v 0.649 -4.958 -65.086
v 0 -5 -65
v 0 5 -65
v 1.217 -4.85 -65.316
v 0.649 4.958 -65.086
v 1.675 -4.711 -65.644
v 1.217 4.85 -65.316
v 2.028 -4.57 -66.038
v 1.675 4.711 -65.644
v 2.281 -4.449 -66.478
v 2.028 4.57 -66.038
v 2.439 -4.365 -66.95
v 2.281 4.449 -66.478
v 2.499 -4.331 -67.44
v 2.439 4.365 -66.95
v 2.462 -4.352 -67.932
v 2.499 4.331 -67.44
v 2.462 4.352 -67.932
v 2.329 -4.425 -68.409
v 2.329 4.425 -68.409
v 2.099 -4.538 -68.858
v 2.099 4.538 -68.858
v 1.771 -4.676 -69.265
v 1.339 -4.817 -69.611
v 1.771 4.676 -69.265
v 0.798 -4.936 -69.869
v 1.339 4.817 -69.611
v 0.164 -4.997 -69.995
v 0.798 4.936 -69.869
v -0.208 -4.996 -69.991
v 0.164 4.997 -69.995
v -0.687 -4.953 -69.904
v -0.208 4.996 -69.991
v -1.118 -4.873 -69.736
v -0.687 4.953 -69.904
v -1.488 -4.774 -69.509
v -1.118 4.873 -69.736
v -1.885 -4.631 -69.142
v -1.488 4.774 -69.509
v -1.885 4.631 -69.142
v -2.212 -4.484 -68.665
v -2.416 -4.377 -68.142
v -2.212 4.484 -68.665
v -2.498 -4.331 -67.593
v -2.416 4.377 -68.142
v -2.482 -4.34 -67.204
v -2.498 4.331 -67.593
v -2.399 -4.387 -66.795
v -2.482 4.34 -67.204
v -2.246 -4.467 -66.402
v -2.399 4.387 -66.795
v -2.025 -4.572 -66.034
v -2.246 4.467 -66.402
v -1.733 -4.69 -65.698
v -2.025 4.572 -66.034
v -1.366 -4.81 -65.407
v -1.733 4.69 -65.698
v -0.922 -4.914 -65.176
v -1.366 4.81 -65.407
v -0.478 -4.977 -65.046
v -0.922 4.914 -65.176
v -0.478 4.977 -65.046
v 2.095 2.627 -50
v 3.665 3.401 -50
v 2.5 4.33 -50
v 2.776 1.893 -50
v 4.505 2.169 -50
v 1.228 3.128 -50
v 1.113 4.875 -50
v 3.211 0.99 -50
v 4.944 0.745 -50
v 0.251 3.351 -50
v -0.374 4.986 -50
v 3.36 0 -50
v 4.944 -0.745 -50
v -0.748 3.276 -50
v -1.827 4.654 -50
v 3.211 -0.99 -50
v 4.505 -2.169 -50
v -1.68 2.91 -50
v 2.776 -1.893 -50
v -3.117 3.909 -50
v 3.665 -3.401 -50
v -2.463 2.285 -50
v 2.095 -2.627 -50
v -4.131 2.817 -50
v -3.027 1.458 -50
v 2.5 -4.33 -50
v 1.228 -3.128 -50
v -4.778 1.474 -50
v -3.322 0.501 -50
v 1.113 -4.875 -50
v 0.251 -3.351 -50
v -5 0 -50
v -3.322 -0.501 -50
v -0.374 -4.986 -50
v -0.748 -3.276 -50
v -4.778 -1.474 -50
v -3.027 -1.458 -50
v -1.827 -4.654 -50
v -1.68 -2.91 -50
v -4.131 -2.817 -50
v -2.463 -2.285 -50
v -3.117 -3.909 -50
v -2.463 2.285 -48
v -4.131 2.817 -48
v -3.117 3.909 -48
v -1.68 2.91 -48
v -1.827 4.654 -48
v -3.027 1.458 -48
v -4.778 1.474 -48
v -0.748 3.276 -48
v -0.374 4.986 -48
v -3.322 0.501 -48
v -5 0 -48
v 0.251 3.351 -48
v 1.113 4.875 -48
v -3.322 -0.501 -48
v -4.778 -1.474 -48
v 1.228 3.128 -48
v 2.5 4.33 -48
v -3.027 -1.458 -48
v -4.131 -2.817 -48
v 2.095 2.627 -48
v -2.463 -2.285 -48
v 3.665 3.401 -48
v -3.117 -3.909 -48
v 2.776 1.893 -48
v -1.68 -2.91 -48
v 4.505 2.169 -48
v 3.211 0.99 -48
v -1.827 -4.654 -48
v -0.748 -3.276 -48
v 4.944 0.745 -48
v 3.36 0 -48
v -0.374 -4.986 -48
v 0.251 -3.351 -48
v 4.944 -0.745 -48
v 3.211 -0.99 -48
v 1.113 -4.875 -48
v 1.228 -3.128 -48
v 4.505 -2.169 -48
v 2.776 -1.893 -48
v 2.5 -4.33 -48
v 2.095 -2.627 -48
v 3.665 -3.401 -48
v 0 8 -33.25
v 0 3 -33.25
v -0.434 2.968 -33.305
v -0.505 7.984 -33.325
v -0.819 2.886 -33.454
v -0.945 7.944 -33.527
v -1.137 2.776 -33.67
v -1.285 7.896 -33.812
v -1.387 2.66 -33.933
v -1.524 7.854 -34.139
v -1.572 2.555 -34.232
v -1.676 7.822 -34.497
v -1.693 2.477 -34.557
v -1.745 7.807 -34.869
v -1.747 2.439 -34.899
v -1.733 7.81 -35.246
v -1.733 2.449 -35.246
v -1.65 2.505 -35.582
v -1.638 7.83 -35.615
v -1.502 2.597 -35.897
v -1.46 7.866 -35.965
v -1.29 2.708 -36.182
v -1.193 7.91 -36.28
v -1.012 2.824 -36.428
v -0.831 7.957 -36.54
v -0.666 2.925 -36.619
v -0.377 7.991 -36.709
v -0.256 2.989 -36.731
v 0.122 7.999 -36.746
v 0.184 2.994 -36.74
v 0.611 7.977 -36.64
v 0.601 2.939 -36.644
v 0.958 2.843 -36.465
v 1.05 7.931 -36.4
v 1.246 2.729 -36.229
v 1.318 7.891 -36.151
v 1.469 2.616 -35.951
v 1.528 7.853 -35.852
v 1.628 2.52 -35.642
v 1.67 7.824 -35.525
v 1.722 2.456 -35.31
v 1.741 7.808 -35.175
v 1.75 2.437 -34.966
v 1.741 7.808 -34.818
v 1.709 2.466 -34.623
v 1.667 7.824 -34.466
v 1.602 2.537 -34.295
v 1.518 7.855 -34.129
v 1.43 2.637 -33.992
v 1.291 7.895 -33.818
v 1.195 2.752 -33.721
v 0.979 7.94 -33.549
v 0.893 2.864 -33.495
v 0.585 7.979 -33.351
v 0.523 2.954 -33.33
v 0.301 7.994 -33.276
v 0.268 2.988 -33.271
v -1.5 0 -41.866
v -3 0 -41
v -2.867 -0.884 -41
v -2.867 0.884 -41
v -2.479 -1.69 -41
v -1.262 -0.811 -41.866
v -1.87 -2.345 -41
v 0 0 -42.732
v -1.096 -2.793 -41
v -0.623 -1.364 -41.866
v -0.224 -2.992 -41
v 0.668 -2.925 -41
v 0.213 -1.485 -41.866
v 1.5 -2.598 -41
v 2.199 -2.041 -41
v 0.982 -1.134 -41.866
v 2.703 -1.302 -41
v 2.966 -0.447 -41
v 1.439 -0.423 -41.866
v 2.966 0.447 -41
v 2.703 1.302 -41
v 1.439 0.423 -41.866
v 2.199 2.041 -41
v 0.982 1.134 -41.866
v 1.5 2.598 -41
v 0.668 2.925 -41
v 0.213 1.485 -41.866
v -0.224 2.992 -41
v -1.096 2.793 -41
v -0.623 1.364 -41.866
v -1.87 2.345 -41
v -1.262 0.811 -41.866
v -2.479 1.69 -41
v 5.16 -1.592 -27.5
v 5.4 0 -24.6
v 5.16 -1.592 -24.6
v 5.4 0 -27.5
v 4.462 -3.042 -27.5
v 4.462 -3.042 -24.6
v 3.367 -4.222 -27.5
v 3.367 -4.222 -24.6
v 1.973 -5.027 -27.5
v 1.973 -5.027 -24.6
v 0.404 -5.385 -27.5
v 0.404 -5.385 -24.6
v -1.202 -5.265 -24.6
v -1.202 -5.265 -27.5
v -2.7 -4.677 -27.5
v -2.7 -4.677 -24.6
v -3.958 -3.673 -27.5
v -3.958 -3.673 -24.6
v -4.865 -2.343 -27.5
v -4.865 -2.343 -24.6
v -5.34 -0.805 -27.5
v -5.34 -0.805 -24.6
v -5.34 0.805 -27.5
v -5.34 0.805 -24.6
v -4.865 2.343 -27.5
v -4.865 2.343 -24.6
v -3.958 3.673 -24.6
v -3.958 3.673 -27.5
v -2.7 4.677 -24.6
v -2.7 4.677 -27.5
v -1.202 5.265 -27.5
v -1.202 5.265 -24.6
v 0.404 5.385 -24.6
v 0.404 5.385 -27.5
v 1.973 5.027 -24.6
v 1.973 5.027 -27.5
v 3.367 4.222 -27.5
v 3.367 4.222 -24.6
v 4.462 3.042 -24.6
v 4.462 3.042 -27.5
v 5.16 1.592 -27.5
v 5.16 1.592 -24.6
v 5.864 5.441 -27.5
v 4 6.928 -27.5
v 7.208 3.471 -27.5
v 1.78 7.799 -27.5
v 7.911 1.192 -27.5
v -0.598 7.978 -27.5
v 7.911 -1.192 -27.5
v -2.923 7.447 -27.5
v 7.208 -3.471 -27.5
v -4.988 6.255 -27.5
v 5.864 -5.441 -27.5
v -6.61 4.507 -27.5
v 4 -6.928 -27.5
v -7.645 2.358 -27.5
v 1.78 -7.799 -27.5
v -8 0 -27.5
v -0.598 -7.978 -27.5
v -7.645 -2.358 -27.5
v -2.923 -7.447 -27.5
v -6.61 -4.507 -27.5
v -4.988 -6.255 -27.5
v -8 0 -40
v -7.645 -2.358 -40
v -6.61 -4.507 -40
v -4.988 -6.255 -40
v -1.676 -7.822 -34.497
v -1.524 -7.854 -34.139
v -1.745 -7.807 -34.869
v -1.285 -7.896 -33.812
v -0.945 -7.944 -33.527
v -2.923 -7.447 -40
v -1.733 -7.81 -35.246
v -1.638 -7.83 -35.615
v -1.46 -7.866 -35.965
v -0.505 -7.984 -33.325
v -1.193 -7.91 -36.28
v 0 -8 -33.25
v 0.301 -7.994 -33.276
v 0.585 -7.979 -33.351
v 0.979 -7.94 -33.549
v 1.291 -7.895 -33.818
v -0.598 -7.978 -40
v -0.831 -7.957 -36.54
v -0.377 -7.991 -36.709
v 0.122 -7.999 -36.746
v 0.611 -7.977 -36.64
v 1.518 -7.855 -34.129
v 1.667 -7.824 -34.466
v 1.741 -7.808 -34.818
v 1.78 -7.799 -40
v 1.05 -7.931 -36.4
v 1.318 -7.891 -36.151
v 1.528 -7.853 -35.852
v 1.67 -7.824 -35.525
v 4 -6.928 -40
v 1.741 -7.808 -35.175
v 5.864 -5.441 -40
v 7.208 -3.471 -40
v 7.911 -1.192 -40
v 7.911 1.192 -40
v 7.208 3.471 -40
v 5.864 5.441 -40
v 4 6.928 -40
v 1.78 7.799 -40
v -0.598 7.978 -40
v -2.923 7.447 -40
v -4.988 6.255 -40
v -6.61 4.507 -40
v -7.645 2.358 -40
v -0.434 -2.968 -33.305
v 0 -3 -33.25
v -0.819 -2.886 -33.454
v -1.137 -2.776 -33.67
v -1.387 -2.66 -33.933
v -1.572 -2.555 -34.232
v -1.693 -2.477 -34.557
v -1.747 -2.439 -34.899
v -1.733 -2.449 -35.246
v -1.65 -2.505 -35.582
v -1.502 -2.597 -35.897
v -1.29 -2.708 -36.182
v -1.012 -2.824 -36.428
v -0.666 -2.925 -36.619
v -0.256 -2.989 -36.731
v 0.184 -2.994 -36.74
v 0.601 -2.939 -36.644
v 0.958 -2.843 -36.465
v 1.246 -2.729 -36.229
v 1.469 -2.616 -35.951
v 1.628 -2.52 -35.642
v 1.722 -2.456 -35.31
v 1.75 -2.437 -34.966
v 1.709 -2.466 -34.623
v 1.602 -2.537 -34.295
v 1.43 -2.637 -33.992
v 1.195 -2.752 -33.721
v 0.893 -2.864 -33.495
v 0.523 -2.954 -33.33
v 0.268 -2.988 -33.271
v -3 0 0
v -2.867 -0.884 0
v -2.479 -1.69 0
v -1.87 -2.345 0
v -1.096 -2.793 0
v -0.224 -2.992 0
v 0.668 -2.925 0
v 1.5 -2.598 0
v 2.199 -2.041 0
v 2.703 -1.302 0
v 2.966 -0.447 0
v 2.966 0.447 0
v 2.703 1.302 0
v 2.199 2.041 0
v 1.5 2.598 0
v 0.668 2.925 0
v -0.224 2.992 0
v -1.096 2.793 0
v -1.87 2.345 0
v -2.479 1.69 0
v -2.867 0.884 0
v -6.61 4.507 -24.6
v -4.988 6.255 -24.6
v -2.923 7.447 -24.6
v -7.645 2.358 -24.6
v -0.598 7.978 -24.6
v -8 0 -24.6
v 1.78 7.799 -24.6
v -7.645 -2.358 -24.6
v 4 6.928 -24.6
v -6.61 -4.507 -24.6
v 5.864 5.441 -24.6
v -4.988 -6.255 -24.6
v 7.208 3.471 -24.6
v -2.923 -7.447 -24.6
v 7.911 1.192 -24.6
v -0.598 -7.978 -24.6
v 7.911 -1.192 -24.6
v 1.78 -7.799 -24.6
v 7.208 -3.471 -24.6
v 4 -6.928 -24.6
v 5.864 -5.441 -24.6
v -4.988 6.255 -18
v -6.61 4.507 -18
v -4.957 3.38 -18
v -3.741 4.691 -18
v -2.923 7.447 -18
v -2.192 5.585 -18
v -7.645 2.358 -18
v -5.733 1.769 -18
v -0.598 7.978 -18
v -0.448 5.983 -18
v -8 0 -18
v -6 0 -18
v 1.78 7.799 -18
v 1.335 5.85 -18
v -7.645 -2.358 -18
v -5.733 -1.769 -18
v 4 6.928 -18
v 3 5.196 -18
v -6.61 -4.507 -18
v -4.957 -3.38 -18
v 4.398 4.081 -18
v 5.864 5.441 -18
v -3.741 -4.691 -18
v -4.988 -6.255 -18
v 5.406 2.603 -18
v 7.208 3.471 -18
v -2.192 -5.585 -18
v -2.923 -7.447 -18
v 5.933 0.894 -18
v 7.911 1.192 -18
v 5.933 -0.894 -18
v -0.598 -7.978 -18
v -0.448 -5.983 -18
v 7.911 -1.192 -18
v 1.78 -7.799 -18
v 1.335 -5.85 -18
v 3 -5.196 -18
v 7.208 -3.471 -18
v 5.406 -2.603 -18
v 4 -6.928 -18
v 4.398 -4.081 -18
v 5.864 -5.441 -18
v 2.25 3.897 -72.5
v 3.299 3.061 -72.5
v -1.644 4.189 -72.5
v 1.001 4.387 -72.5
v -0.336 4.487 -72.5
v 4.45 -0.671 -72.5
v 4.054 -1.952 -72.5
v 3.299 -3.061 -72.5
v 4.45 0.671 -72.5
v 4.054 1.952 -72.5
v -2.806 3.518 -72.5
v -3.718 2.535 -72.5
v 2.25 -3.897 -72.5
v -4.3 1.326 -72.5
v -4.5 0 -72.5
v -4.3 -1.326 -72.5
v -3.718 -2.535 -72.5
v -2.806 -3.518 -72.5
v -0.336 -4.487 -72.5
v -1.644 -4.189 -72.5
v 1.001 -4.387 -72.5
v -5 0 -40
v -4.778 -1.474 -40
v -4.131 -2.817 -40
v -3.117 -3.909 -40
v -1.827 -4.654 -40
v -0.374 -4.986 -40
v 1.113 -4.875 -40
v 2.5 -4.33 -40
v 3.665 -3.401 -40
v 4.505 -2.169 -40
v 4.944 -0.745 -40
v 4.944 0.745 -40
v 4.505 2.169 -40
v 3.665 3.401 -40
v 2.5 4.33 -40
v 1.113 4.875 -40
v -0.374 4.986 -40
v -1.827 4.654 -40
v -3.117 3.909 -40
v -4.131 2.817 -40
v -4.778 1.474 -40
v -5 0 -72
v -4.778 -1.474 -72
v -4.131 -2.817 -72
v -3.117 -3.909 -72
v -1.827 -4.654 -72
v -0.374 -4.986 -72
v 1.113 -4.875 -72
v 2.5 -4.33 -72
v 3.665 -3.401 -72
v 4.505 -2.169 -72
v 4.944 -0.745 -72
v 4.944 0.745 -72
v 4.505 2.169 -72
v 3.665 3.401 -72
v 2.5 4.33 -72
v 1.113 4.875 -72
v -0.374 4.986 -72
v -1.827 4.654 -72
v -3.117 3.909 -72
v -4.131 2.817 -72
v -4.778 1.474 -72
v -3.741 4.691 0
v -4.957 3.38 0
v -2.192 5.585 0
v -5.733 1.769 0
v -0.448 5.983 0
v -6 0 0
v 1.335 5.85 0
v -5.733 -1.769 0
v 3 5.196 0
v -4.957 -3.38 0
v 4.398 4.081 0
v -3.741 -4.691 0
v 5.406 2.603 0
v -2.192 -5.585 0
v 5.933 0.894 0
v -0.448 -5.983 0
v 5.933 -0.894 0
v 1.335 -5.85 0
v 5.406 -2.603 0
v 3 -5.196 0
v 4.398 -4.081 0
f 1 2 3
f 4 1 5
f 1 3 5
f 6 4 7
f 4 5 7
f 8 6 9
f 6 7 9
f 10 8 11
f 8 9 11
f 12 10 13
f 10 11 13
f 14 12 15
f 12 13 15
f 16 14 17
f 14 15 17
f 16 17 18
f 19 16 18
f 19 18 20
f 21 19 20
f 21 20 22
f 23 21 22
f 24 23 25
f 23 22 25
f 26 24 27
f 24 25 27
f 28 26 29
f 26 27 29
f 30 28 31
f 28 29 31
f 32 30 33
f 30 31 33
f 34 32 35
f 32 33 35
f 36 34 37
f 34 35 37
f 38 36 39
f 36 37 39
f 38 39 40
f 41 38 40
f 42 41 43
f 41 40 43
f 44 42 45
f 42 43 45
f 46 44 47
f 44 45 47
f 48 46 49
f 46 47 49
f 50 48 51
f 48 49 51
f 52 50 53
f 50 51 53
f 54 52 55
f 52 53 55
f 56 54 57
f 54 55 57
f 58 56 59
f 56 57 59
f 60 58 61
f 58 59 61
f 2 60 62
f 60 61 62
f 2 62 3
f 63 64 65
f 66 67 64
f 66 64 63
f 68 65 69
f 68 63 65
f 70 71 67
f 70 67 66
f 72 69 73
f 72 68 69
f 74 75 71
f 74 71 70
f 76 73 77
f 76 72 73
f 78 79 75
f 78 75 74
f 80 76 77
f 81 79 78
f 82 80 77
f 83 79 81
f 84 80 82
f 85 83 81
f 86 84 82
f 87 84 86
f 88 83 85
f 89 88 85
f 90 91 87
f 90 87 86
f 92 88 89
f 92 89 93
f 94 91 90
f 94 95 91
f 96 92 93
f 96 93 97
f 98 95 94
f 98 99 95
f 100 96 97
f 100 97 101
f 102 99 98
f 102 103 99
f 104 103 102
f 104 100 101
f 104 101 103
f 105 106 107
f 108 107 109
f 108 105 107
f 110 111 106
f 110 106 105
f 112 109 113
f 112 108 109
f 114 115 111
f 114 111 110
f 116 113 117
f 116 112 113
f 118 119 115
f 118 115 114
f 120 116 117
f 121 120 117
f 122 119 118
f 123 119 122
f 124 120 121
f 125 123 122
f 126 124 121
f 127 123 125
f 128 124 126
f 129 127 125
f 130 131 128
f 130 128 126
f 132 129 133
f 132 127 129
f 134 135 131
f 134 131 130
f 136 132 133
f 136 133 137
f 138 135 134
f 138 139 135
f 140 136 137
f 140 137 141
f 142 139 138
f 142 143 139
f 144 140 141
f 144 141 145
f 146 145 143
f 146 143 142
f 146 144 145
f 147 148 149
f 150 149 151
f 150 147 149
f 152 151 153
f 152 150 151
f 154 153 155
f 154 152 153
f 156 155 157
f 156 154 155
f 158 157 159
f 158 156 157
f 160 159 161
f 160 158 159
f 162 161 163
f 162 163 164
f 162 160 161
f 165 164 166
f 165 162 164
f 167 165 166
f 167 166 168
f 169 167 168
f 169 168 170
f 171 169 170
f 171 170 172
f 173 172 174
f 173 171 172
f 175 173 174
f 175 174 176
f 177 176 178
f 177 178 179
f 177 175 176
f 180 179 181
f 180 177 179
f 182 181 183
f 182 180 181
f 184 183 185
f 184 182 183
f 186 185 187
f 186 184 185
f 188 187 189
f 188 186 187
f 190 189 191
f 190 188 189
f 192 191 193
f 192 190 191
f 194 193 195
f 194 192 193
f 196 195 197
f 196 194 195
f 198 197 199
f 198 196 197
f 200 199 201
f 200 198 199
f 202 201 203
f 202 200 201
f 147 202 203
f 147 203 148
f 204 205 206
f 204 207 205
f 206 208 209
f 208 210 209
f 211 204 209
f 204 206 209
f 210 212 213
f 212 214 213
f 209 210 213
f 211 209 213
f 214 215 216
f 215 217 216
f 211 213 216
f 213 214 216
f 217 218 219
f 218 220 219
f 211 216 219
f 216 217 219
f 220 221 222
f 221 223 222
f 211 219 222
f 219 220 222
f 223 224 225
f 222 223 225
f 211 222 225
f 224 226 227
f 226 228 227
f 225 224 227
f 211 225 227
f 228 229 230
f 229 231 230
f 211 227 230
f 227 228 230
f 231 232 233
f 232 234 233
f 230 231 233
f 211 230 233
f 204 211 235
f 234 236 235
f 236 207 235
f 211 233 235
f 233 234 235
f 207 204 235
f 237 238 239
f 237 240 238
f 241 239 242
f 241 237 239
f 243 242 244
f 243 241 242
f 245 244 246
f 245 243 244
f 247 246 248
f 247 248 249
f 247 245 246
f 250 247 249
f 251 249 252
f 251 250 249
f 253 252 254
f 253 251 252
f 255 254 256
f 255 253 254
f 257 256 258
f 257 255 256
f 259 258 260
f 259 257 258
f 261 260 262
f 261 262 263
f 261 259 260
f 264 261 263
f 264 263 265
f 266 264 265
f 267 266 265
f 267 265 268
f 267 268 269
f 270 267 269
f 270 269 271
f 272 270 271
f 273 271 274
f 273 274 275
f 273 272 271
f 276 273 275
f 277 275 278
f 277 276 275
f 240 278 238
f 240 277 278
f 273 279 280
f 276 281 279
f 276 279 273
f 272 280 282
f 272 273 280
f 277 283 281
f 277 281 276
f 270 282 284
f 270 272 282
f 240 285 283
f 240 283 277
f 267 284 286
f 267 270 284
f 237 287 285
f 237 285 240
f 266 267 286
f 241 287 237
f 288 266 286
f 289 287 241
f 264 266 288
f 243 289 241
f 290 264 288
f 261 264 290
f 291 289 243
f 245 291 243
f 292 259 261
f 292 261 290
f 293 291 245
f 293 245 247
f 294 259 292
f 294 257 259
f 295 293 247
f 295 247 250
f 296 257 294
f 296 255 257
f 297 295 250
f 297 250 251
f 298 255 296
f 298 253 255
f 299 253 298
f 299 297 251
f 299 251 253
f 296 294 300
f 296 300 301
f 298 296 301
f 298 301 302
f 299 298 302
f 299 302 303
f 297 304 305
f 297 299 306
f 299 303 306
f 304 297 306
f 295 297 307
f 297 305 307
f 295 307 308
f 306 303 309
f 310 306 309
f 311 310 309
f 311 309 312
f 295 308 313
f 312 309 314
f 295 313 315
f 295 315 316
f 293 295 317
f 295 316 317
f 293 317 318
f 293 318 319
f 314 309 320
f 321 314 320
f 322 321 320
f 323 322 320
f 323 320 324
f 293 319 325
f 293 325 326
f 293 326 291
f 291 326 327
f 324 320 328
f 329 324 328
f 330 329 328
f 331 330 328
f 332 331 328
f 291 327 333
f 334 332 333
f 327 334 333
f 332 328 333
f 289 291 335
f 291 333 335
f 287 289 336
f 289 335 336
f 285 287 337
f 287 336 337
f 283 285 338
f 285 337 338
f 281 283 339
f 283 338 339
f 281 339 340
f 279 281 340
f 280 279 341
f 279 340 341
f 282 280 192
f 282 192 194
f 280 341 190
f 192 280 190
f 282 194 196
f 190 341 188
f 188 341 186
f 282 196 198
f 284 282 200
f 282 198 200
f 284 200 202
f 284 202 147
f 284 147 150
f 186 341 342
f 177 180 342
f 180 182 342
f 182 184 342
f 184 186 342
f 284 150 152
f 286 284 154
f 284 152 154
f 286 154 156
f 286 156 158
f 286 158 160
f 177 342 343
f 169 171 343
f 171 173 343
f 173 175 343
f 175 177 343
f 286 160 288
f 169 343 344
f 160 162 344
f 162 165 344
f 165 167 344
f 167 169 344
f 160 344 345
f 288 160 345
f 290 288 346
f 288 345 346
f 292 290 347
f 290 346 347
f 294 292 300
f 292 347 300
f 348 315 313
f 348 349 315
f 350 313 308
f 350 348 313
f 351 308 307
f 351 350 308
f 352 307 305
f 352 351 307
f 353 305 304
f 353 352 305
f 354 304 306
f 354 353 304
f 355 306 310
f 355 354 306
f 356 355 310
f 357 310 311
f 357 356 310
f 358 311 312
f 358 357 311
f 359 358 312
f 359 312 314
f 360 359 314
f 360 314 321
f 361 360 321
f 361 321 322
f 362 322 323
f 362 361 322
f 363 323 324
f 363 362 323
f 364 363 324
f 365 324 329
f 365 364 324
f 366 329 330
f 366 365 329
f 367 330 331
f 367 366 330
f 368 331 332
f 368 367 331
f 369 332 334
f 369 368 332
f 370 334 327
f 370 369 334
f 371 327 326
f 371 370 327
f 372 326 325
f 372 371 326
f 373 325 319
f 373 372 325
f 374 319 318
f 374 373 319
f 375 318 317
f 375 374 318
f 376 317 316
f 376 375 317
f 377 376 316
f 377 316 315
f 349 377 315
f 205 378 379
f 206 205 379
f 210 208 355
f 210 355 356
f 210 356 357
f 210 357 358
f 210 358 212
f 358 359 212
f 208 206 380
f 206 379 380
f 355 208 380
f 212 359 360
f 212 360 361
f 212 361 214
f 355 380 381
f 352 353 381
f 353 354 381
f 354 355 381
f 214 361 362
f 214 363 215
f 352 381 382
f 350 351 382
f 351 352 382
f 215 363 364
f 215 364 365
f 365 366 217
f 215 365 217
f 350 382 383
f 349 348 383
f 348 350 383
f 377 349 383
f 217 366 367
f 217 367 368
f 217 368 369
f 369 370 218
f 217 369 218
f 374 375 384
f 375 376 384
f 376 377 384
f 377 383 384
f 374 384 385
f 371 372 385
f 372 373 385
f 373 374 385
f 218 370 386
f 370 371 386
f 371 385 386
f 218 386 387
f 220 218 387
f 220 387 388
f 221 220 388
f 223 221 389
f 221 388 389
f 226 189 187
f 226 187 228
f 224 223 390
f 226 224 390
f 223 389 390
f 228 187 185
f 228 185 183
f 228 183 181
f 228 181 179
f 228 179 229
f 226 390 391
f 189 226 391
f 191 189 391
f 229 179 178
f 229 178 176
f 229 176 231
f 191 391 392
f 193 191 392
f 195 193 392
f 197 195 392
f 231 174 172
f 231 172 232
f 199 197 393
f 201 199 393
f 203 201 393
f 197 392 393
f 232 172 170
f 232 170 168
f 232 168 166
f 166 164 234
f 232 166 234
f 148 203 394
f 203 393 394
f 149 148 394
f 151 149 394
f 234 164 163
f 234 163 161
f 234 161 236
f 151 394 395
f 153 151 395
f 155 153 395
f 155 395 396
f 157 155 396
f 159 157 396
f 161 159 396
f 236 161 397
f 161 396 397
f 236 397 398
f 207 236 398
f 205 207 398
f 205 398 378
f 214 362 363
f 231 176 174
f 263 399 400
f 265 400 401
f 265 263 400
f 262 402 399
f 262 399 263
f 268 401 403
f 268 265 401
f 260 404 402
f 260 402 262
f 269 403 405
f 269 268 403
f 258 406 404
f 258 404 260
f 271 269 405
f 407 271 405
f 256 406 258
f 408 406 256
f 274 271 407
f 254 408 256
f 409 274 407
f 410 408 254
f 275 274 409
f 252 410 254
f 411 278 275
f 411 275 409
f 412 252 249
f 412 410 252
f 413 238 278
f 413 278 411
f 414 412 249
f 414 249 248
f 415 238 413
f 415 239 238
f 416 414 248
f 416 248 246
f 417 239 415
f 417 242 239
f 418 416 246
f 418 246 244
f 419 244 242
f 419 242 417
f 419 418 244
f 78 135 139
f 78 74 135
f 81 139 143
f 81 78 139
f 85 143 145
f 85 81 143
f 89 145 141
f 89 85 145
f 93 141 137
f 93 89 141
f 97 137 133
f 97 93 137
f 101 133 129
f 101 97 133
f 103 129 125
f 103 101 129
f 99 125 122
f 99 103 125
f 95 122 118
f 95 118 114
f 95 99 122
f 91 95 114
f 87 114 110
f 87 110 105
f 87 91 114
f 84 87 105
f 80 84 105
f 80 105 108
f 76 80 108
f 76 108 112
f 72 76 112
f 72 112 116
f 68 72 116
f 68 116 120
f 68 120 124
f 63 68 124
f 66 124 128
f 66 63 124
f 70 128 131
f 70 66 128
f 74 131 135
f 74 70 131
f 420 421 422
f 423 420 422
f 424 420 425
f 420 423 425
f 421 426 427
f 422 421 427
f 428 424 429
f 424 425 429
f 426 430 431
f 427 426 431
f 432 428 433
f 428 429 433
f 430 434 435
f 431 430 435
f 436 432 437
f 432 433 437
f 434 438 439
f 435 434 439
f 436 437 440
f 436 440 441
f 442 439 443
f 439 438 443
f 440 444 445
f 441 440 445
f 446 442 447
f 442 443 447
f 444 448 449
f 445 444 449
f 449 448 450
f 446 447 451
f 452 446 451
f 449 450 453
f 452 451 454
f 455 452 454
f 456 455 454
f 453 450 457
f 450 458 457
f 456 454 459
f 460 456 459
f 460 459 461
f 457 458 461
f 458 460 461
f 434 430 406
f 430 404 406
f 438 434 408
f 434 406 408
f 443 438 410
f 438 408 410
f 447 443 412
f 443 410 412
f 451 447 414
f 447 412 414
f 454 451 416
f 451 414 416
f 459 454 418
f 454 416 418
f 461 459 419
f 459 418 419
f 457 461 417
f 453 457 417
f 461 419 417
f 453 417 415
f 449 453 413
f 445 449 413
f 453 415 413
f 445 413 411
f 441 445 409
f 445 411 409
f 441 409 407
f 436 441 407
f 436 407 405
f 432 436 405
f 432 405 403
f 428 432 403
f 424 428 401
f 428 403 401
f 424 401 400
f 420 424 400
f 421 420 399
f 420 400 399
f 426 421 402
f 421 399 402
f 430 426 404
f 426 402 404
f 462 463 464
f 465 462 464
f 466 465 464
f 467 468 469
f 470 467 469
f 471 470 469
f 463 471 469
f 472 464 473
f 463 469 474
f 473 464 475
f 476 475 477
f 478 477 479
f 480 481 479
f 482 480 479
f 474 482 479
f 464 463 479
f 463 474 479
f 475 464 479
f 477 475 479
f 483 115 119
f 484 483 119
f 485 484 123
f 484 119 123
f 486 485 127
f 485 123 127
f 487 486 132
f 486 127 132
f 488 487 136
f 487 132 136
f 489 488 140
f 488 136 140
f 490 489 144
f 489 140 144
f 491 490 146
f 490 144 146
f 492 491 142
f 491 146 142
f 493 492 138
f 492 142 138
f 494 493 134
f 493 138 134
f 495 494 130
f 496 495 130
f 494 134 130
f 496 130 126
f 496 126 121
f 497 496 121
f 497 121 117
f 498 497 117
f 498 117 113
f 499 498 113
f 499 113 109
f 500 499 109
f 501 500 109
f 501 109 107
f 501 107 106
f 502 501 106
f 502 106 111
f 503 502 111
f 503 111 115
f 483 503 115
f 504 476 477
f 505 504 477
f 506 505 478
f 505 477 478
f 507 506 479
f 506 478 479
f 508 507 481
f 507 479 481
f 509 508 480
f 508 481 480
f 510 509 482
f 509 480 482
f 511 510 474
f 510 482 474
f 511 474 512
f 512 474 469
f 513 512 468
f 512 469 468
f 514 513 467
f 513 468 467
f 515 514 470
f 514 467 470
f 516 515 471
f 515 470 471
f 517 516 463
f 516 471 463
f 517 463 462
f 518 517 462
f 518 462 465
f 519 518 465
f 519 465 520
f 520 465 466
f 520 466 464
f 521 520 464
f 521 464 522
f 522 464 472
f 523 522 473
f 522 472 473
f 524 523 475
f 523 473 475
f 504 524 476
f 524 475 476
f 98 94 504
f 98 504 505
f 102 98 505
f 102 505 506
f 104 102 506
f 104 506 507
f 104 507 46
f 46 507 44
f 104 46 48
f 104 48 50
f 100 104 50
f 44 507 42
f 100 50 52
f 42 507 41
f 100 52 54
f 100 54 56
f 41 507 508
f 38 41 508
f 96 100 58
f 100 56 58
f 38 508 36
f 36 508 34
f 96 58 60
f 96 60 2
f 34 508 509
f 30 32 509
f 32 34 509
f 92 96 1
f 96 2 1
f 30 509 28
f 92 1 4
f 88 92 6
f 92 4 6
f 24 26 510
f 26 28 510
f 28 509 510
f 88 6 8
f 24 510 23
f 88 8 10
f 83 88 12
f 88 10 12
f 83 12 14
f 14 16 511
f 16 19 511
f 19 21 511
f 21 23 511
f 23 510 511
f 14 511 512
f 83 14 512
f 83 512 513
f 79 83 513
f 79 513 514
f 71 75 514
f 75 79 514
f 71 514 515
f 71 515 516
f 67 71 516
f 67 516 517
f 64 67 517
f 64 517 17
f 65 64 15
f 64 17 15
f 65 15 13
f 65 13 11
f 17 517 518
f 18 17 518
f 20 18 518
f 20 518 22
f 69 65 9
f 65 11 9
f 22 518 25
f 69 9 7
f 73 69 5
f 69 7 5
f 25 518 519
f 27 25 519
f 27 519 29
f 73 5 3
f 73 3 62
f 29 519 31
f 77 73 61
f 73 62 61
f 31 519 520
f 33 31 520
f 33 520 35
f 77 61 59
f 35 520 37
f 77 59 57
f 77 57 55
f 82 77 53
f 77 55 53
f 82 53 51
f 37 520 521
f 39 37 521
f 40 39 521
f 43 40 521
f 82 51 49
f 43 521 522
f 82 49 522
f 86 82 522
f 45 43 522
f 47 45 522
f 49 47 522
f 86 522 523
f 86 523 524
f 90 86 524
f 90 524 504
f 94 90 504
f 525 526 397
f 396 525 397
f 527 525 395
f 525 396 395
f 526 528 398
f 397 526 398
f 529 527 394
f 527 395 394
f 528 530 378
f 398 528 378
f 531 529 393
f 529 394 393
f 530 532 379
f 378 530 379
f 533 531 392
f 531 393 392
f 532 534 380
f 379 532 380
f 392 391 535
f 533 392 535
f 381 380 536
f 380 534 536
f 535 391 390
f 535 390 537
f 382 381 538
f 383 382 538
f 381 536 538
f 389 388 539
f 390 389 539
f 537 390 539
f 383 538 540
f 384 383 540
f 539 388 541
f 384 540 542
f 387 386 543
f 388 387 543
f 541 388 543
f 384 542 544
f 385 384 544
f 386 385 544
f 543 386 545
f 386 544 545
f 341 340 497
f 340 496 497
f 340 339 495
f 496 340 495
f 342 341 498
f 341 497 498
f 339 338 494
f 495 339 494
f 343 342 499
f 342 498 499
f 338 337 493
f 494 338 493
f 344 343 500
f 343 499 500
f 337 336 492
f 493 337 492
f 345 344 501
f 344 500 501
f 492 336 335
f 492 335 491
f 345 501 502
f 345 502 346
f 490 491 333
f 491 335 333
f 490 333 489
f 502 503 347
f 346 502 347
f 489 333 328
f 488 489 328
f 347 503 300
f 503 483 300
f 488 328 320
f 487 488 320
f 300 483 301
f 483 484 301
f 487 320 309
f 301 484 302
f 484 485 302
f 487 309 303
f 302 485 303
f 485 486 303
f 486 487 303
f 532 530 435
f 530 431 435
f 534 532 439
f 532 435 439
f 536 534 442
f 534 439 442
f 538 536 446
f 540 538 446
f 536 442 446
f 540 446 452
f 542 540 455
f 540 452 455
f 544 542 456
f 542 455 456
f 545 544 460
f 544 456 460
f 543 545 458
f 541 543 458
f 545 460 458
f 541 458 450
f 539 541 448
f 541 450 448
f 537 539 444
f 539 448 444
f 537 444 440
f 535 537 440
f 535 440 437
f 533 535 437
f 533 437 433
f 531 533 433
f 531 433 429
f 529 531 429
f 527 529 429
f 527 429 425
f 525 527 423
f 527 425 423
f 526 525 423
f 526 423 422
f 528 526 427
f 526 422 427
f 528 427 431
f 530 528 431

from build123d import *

# Parameters (mm, degrees)
ESQUISSE3_W             = 1.75
ESQUISSE3_H             = 18.21482984
CHANFREIN1_SIZE         = 0.5
ESQUISSE6_R             = 2.5
ENL_V_MAT_EXTRU_1_DEPTH = 7.5


with BuildPart() as part:
    # Esquisse2 → Base-Révolution (revolve)
    with BuildSketch(Plane(origin=(0, 0, 0), x_dir=(0, 0, -1), z_dir=(1, 0, 0))):
        Polygon((0, -3), (0, -6), (18, -6), (18, -8), (40, -8), (40, -5), (72.5, -5), (72.5, 0), (42.732050808, 0), (41, -3), align=None)
    revolve(axis=Axis((0, 0, 0), (0, 0, 1)))

    # Esquisse3 → Enlèvement de matière-Révolution1 (revolve, cut)
    with BuildSketch(Plane(origin=(0, 0, -35), x_dir=(-1, 0, 0), z_dir=(0, 0, -1))):
        with Locations((-0.875, 0.285598377)):
            Rectangle(ESQUISSE3_W, ESQUISSE3_H)
    revolve(axis=Axis((0, 0, -35), (0, -1, 0)), mode=Mode.SUBTRACT)

    # Chanfrein1
    chanfrein1_edges = [part.edges().sort_by_distance(p)[0] for p in [
        (0, 5, -72.5),
    ]]
    chamfer(chanfrein1_edges, length=CHANFREIN1_SIZE)

    # Esquisse6 → Enlèv. mat.-Extru.1 (cut, symmetric)
    with BuildSketch(Plane(origin=(0, 0, 0), x_dir=(1, 0, 0), z_dir=(0, 1, 0))):
        with Locations((0, 67.5)):
            Circle(ESQUISSE6_R)
    extrude(amount=ENL_V_MAT_EXTRU_1_DEPTH, both=True, mode=Mode.SUBTRACT)

    # Esquisse5 → Enlèvement de matière-Révolution3 (revolve, cut)
    with BuildSketch(Plane(origin=(0, 0, 0), x_dir=(0, 0, -1), z_dir=(1, 0, 0))):
        Polygon((24.6, 30), (24.6, 5.4), (27.5, 5.4), (27.5, 20), (48, 20), (48, 3.36), (50, 3.36), (50, 30), align=None)
    revolve(axis=Axis((0, 0, 18.428634536), (0, 0, -1)), mode=Mode.SUBTRACT)


solid = part.part
